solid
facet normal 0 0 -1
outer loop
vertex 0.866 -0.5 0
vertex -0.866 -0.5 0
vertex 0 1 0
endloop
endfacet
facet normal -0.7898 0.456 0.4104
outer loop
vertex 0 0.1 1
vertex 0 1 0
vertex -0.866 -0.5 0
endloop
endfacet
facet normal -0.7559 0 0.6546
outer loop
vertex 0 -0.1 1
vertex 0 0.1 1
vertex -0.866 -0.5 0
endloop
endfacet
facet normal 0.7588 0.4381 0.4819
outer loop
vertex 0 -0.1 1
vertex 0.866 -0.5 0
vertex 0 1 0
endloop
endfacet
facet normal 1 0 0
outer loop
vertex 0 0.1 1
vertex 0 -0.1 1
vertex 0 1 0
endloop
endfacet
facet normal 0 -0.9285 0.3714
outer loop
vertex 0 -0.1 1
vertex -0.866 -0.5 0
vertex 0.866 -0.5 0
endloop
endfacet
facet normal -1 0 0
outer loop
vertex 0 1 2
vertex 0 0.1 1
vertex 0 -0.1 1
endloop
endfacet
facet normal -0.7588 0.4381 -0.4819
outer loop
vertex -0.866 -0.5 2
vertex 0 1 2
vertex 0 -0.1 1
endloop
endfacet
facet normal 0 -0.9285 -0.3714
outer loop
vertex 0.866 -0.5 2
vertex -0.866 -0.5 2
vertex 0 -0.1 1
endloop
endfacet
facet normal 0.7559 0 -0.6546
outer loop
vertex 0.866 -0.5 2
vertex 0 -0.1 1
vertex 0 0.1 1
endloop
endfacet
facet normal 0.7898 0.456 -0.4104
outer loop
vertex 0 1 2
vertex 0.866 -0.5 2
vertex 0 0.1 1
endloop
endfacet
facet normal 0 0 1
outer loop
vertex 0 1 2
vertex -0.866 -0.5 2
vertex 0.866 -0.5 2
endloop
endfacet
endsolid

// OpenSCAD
h = 1;

// A cylinder with a triangular base and a slim waist which is collapsed into a single edge.
// This is a non-manifold object since the collapsed vertices are not distinct.
polyhedron(
  points=[
    [0,1,0],
    [cos(210), sin(210),0],
    [cos(330), sin(330),0],

    [0,0.1,h],
    [0.1*cos(270), 0.1*sin(270),h],

    [0,1,2*h],
    [cos(210), sin(210),2*h],
    [cos(330), sin(330),2*h],
  ],
  faces=[
    [0,1,2],
    [1,0,3],[1,3,4],
    [0,2,4],[0,4,3],
    [2,1,4],

    [4,3,5],[4,5,6],
    [4,6,7],
    [3,4,7],[3,7,5],
    [7,6,5],
  ]);
